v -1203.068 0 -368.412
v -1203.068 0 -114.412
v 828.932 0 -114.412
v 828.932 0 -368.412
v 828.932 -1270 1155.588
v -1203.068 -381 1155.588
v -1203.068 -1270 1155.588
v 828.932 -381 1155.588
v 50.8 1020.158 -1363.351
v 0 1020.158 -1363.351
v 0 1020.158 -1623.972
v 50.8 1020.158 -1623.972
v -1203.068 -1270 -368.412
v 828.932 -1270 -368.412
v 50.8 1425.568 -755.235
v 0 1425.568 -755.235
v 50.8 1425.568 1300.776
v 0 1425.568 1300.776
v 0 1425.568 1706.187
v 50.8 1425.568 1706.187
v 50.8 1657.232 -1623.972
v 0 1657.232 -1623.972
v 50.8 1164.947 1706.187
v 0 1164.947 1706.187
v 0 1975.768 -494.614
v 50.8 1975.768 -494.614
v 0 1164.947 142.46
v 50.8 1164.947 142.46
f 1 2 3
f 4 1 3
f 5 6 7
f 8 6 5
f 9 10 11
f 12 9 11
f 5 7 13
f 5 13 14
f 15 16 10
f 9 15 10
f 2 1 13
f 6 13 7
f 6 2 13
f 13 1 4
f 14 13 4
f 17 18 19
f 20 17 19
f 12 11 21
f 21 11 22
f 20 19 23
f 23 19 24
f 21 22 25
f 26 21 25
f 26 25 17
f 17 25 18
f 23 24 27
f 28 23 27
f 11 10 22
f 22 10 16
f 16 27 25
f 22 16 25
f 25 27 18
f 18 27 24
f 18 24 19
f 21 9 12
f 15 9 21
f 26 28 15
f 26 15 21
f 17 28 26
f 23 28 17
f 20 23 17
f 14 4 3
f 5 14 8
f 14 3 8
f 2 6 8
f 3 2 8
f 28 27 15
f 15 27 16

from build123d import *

# Parameters (mm, degrees)
F0_W     = 2032
F0_H     = 1524
F1_DEPTH = 1270
F2_SIZE2 = 381
F2_SIZE  = 1270
F4_DEPTH = 50.8


with BuildPart() as f1:
    # F0 (on Front) → F1 (new body)
    with BuildSketch(Plane.XZ):
        with Locations((-187.0675954819, 393.5881609917)):
            Rectangle(F0_W, F0_H)
    extrude(amount=F1_DEPTH)

    # F2
    f2_edges = [f1.edges().sort_by_distance(p)[0] for p in [
        (-187.067595, 0, 1155.588161),
    ]]
    f2_side = f1.faces().sort_by_distance((-187.067595, 0, 393.588161))[0]
    chamfer(f2_edges, length=F2_SIZE, length2=F2_SIZE2, reference=f2_side)


with BuildPart() as f4:
    # F3 (on Right) → F4 (new body)
    with BuildSketch(Plane.YZ):
        Polygon((1425.5683422049, 1300.7762432086), (1425.5683422049, 1706.1868906009), (1164.9472713444, 1706.1868906009), (1164.9472713444, 142.4601227037), (1425.5683422049, -755.234837532), (1020.1576948166, -1363.3507490158), (1020.1576948166, -1623.9718198776), (1657.2315692902, -1623.9718198776), (1975.7684469223, -494.6137070656), align=None)
    extrude(amount=F4_DEPTH)


solid = Compound([f1.part, f4.part])
